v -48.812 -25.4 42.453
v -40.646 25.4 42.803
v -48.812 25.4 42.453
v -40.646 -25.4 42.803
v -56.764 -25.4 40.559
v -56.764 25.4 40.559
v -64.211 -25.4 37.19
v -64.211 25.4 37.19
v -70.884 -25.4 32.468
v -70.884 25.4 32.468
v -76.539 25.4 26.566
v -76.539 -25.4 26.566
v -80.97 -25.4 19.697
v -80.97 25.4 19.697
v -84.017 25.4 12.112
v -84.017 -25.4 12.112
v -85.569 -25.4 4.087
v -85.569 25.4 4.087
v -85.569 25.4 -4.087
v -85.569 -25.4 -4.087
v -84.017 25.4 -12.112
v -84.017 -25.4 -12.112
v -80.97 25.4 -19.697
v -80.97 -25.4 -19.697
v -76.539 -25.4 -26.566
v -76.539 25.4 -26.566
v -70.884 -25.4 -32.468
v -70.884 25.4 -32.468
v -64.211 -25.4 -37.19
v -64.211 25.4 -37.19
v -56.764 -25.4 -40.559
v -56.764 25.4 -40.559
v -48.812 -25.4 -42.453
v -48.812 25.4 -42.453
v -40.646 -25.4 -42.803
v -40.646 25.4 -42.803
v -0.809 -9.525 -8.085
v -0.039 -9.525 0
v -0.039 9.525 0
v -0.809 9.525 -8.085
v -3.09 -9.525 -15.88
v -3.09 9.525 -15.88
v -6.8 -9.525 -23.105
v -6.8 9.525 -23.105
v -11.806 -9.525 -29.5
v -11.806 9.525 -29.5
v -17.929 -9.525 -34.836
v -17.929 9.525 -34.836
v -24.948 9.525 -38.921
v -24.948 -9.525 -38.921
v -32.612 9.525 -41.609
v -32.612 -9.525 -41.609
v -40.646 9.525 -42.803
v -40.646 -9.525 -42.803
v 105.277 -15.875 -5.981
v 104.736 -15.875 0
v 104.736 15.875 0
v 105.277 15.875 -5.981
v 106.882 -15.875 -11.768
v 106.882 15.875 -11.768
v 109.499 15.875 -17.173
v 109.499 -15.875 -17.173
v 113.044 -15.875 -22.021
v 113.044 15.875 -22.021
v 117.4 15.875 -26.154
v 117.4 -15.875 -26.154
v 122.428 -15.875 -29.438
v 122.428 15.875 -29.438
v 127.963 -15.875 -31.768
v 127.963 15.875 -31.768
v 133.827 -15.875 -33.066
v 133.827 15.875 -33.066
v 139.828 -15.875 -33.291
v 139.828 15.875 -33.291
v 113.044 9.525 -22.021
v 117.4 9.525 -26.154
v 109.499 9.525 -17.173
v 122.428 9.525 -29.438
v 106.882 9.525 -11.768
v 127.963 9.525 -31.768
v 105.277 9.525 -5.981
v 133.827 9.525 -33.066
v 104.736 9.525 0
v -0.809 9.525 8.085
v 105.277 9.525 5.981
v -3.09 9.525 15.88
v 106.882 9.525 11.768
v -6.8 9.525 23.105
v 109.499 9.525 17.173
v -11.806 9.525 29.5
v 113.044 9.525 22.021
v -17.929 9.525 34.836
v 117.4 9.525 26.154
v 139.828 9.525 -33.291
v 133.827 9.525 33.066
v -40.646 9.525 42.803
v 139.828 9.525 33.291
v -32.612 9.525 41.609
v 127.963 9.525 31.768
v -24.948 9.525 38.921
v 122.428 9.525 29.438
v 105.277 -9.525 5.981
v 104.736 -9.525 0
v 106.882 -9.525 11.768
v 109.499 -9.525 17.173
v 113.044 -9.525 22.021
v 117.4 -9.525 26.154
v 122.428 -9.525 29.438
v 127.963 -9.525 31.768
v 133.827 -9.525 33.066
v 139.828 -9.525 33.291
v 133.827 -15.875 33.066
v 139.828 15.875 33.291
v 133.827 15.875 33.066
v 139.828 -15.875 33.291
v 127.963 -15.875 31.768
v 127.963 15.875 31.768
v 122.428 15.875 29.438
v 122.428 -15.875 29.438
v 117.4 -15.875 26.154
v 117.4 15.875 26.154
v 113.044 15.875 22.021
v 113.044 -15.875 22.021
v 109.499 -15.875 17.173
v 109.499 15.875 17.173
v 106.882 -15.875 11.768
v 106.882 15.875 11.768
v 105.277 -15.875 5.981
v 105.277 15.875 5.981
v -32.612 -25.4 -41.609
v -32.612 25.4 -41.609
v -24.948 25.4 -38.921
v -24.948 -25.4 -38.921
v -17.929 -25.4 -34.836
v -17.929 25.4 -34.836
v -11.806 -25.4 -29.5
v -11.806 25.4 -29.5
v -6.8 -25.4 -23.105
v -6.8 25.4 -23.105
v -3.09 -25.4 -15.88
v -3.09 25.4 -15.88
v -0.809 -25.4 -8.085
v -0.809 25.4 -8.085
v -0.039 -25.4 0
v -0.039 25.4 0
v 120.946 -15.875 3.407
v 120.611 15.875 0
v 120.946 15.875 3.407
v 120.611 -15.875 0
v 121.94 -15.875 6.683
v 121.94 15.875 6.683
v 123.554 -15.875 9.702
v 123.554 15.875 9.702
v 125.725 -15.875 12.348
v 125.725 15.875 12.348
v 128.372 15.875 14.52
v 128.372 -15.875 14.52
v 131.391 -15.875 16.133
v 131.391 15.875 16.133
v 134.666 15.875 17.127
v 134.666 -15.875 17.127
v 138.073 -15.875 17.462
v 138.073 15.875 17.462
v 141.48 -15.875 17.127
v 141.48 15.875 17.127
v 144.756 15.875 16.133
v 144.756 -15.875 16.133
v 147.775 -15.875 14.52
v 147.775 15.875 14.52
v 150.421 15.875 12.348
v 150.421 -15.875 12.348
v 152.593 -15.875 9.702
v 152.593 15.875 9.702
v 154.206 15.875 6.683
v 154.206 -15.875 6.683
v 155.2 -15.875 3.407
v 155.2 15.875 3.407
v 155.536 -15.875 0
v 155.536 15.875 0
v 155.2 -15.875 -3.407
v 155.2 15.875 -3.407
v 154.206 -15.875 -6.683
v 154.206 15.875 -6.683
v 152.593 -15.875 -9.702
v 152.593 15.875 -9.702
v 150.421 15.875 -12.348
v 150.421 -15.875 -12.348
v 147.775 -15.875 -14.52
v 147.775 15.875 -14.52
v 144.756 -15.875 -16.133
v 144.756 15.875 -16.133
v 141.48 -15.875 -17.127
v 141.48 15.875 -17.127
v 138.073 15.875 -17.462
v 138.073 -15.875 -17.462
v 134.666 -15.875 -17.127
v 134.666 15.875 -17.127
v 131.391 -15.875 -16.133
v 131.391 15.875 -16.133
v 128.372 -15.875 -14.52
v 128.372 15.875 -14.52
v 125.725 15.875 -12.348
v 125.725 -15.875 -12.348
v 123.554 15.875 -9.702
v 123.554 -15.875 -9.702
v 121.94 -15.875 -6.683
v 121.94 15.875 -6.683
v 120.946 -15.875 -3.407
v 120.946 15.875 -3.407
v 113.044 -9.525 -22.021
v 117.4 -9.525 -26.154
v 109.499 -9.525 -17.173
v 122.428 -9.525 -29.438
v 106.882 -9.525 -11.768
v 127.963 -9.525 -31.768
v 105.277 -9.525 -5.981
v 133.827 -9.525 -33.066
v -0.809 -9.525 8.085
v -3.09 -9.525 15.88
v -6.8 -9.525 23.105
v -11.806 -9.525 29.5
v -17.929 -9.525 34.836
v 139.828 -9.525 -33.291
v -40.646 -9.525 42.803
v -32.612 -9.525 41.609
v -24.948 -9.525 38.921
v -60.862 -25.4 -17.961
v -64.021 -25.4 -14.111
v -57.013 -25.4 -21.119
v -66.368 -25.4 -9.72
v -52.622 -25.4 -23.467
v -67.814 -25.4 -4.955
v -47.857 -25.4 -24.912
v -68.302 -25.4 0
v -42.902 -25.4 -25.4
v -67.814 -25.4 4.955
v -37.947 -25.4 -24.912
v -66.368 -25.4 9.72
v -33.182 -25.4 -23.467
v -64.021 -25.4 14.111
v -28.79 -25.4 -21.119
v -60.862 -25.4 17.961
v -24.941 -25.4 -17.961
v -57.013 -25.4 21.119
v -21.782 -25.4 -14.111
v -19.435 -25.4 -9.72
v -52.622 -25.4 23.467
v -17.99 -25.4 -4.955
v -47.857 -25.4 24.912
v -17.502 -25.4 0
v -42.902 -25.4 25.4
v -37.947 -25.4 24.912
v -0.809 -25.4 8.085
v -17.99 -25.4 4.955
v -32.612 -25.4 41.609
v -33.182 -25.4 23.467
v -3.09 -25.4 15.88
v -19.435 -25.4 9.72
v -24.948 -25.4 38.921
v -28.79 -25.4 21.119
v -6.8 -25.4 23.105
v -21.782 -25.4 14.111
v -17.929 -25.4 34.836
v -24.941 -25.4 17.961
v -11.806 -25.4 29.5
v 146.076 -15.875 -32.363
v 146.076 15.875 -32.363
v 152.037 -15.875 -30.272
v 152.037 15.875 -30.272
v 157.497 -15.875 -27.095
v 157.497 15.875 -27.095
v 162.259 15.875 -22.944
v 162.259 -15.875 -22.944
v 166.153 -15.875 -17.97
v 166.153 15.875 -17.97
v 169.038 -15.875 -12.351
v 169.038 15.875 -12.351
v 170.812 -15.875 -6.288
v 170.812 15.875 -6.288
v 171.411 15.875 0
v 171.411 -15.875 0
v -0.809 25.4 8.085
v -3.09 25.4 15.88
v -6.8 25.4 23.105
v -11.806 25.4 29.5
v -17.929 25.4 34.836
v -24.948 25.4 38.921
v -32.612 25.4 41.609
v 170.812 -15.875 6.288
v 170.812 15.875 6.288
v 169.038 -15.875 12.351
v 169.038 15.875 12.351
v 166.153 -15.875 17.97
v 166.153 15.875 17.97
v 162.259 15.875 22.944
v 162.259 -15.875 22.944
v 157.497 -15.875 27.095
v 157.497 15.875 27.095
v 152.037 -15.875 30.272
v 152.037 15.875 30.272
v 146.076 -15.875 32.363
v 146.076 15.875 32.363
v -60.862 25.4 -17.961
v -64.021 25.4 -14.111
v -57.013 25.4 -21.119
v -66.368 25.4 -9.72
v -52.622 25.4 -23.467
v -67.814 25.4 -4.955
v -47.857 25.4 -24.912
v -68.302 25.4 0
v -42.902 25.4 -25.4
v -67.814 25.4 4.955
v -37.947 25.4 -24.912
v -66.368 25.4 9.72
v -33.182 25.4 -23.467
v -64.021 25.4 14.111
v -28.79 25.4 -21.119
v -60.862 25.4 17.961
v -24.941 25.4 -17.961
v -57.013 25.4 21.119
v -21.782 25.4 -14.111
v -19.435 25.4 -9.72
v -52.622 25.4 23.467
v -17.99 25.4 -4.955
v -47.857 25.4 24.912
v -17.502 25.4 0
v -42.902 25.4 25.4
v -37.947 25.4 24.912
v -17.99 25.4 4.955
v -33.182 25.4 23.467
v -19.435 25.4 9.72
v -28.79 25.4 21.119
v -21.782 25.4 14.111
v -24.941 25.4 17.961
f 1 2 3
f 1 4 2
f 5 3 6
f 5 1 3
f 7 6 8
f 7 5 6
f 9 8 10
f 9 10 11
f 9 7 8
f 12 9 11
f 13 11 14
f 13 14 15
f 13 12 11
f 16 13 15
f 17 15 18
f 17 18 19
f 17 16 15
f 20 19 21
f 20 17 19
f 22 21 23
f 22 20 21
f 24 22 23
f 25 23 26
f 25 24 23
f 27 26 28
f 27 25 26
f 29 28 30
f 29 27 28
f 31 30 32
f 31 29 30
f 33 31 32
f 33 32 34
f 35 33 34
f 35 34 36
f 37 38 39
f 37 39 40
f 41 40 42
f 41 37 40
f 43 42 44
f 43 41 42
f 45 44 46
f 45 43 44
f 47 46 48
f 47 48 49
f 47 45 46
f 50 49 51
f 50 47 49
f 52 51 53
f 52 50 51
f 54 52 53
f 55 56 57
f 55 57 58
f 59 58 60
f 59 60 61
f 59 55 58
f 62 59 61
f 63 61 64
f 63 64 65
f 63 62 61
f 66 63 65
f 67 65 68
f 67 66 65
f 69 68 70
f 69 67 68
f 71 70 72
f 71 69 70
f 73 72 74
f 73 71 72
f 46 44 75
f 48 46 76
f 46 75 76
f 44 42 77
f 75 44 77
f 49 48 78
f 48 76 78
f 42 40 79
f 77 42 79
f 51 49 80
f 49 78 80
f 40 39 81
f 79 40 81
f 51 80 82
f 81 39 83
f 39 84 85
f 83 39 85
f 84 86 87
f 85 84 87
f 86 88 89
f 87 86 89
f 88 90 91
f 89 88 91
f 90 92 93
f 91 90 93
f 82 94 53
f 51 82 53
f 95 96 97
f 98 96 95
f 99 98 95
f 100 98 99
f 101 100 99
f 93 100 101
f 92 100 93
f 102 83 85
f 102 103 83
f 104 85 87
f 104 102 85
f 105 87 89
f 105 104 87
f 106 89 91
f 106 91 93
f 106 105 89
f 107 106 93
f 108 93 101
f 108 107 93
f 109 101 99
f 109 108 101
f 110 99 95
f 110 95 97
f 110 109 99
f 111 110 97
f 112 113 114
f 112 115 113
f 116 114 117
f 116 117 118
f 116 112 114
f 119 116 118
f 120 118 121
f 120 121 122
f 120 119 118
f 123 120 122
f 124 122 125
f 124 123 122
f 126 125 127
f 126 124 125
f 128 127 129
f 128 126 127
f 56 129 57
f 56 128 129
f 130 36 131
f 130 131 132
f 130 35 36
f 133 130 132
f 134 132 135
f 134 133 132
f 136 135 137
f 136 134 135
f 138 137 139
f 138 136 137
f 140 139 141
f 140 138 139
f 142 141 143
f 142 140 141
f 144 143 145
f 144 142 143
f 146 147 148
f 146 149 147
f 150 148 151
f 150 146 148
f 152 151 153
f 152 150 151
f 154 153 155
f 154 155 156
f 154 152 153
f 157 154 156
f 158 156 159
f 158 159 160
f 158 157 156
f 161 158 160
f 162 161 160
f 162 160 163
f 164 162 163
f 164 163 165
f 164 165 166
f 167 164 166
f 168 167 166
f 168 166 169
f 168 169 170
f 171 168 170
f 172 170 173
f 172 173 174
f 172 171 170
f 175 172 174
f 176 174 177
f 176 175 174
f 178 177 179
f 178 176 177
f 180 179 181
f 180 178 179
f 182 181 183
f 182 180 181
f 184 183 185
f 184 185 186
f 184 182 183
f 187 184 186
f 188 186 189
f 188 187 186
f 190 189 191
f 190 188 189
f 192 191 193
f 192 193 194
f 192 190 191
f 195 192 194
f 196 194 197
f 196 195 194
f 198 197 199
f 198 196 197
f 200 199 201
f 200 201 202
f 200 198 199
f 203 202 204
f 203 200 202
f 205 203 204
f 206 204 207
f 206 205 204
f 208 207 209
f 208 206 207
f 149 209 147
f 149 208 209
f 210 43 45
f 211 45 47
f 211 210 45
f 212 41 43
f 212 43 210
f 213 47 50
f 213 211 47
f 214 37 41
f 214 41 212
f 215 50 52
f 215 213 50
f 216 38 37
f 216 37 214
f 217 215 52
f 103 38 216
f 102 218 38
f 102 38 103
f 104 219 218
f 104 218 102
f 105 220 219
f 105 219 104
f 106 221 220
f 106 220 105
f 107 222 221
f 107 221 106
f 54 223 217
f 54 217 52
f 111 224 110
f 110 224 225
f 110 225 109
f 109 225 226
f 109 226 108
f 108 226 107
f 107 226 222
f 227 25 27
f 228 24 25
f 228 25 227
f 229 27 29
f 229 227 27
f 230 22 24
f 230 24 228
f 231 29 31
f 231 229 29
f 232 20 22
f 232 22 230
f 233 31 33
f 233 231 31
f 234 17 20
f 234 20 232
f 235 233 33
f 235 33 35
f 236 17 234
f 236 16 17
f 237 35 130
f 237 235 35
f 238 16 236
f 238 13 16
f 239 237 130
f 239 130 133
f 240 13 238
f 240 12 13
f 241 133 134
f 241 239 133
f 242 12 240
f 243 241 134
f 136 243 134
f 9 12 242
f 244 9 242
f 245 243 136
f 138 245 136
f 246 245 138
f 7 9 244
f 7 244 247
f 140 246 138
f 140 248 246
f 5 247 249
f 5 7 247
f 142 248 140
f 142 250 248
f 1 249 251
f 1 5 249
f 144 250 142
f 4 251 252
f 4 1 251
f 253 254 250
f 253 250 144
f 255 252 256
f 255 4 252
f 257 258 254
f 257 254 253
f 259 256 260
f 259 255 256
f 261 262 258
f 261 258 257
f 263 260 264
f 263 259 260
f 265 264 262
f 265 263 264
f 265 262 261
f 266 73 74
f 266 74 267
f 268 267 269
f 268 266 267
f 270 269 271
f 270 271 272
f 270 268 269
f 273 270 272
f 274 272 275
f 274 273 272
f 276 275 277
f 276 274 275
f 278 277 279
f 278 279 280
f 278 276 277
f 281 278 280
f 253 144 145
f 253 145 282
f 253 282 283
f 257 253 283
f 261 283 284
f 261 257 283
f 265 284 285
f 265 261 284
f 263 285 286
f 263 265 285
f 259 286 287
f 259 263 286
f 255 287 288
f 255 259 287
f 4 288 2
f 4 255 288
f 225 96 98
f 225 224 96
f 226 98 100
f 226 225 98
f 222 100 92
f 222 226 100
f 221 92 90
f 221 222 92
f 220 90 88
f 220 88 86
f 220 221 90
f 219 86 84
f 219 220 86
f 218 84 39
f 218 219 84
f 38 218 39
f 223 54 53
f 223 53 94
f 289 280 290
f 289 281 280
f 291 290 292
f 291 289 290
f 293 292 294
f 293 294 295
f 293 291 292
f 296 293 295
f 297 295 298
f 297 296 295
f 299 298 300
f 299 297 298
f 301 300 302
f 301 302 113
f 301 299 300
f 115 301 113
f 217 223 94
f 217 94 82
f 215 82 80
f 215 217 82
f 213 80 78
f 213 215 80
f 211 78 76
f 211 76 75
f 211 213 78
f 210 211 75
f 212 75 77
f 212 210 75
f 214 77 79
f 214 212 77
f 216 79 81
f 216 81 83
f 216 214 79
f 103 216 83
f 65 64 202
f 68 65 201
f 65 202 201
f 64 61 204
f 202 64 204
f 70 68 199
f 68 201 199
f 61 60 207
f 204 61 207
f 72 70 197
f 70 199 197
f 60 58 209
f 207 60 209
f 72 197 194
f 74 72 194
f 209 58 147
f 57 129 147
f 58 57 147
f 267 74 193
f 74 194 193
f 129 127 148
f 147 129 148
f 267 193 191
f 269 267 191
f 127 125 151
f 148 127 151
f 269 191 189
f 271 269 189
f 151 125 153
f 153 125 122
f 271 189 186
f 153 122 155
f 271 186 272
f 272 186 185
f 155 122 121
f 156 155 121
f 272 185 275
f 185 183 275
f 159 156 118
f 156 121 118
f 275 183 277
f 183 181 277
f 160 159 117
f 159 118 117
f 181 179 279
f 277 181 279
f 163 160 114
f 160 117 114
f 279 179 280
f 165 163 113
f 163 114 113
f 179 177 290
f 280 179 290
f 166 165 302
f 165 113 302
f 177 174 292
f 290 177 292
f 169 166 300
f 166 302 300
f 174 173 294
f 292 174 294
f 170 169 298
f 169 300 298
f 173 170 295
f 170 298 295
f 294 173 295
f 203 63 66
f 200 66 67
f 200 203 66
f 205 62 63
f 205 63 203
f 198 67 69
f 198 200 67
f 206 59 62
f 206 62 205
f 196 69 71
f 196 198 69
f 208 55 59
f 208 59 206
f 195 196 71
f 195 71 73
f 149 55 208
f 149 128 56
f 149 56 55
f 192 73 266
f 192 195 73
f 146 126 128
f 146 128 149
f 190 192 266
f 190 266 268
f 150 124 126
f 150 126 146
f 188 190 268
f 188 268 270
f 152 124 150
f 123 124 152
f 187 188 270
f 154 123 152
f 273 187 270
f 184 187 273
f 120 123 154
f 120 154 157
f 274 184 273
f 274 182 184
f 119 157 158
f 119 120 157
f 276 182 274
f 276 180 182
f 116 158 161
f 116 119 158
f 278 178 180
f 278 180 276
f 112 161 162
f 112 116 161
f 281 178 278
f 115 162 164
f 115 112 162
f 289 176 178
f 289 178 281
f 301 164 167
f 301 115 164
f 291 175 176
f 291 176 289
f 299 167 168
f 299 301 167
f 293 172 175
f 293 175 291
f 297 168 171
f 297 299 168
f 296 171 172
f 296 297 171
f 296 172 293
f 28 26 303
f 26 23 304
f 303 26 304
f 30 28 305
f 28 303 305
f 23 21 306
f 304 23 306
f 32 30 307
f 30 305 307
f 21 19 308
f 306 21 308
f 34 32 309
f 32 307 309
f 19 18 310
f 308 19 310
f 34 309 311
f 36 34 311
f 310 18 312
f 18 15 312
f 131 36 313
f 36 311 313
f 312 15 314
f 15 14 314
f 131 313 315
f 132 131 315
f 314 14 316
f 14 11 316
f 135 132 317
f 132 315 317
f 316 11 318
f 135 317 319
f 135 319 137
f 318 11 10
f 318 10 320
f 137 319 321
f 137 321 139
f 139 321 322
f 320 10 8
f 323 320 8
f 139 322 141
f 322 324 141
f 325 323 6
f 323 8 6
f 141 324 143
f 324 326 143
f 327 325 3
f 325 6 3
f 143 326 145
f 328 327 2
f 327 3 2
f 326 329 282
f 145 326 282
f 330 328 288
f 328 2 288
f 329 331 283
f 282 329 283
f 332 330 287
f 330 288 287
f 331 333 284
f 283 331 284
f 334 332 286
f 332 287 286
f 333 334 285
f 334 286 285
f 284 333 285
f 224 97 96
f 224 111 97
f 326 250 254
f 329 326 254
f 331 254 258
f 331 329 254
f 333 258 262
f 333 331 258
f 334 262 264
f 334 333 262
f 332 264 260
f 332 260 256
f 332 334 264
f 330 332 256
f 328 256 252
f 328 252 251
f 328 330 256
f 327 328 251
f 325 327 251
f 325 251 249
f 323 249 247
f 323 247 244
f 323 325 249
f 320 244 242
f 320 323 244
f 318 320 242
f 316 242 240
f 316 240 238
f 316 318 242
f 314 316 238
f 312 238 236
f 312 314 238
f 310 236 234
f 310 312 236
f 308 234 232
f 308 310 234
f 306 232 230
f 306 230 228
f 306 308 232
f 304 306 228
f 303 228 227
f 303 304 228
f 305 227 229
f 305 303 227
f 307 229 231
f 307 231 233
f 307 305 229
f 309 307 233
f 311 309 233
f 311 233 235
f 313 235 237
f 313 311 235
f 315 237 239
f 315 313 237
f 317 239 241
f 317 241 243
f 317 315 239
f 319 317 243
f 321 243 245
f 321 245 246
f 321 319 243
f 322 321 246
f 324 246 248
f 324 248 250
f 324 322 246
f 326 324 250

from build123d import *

# Parameters (mm, degrees)
F0_R     = 25.4
F1_DEPTH = 25.4
F2_DEPTH = 15.875
F3_DEPTH = 9.525


with BuildPart() as f1:
    # F0 (on Front) → F1 (new body, symmetric)
    with BuildSketch(Plane.XZ):
        with BuildLine():
            ThreePointArc((-40.645878, -42.803092), (-11.806073, -29.499996), (-0.039299, 0))
            ThreePointArc((-0.039299, 0), (-11.806073, 29.499996), (-40.645878, 42.803092))
            ThreePointArc((-40.645878, 42.803092), (-85.764299, 0), (-40.645878, -42.803092))
        make_face()
        with Locations((-42.901799, 0)):
            Circle(F0_R, mode=Mode.SUBTRACT)
    extrude(amount=F1_DEPTH, both=True)


with BuildPart() as f2:
    # F0 (on Front) → F2 (new body, symmetric)
    with BuildSketch(Plane.XZ):
        with BuildLine():
            ThreePointArc((139.827806, 33.291294), (115.12876, 24.185564), (104.735701, 0))
            ThreePointArc((104.735701, 0), (115.12876, -24.185564), (139.827806, -33.291294))
            ThreePointArc((139.827806, -33.291294), (162.258765, -22.944441), (171.410701, 0))
            ThreePointArc((171.410701, 0), (162.258765, 22.944441), (139.827806, 33.291294))
        make_face()
        with BuildLine():
            ThreePointArc((155.535701, 0), (138.073201, -17.4625), (120.610701, 0))
            ThreePointArc((120.610701, 0), (138.073201, 17.4625), (155.535701, 0))
        make_face(mode=Mode.SUBTRACT)
    extrude(amount=F2_DEPTH, both=True)


with BuildPart() as f3:
    # F0 (on Front) → F3 (new body, symmetric)
    with BuildSketch(Plane.XZ):
        with BuildLine():
            ThreePointArc((-40.645878, 42.803092), (-11.806073, 29.499996), (-0.039299, 0))
            Line((-0.039299, 0), (104.735701, 0))
            ThreePointArc((104.735701, 0), (115.12876, 24.185564), (139.827806, 33.291294))
            Line((139.827806, 33.291294), (-40.645878, 42.803092))
        make_face()
        with BuildLine():
            Line((104.735701, 0), (-0.039299, 0))
            ThreePointArc((-0.039299, 0), (-11.806073, -29.499996), (-40.645878, -42.803092))
            Line((-40.645878, -42.803092), (139.827806, -33.291294))
            ThreePointArc((139.827806, -33.291294), (115.12876, -24.185564), (104.735701, 0))
        make_face()
    extrude(amount=F3_DEPTH, both=True)


solid = Compound([f1.part, f2.part, f3.part])
